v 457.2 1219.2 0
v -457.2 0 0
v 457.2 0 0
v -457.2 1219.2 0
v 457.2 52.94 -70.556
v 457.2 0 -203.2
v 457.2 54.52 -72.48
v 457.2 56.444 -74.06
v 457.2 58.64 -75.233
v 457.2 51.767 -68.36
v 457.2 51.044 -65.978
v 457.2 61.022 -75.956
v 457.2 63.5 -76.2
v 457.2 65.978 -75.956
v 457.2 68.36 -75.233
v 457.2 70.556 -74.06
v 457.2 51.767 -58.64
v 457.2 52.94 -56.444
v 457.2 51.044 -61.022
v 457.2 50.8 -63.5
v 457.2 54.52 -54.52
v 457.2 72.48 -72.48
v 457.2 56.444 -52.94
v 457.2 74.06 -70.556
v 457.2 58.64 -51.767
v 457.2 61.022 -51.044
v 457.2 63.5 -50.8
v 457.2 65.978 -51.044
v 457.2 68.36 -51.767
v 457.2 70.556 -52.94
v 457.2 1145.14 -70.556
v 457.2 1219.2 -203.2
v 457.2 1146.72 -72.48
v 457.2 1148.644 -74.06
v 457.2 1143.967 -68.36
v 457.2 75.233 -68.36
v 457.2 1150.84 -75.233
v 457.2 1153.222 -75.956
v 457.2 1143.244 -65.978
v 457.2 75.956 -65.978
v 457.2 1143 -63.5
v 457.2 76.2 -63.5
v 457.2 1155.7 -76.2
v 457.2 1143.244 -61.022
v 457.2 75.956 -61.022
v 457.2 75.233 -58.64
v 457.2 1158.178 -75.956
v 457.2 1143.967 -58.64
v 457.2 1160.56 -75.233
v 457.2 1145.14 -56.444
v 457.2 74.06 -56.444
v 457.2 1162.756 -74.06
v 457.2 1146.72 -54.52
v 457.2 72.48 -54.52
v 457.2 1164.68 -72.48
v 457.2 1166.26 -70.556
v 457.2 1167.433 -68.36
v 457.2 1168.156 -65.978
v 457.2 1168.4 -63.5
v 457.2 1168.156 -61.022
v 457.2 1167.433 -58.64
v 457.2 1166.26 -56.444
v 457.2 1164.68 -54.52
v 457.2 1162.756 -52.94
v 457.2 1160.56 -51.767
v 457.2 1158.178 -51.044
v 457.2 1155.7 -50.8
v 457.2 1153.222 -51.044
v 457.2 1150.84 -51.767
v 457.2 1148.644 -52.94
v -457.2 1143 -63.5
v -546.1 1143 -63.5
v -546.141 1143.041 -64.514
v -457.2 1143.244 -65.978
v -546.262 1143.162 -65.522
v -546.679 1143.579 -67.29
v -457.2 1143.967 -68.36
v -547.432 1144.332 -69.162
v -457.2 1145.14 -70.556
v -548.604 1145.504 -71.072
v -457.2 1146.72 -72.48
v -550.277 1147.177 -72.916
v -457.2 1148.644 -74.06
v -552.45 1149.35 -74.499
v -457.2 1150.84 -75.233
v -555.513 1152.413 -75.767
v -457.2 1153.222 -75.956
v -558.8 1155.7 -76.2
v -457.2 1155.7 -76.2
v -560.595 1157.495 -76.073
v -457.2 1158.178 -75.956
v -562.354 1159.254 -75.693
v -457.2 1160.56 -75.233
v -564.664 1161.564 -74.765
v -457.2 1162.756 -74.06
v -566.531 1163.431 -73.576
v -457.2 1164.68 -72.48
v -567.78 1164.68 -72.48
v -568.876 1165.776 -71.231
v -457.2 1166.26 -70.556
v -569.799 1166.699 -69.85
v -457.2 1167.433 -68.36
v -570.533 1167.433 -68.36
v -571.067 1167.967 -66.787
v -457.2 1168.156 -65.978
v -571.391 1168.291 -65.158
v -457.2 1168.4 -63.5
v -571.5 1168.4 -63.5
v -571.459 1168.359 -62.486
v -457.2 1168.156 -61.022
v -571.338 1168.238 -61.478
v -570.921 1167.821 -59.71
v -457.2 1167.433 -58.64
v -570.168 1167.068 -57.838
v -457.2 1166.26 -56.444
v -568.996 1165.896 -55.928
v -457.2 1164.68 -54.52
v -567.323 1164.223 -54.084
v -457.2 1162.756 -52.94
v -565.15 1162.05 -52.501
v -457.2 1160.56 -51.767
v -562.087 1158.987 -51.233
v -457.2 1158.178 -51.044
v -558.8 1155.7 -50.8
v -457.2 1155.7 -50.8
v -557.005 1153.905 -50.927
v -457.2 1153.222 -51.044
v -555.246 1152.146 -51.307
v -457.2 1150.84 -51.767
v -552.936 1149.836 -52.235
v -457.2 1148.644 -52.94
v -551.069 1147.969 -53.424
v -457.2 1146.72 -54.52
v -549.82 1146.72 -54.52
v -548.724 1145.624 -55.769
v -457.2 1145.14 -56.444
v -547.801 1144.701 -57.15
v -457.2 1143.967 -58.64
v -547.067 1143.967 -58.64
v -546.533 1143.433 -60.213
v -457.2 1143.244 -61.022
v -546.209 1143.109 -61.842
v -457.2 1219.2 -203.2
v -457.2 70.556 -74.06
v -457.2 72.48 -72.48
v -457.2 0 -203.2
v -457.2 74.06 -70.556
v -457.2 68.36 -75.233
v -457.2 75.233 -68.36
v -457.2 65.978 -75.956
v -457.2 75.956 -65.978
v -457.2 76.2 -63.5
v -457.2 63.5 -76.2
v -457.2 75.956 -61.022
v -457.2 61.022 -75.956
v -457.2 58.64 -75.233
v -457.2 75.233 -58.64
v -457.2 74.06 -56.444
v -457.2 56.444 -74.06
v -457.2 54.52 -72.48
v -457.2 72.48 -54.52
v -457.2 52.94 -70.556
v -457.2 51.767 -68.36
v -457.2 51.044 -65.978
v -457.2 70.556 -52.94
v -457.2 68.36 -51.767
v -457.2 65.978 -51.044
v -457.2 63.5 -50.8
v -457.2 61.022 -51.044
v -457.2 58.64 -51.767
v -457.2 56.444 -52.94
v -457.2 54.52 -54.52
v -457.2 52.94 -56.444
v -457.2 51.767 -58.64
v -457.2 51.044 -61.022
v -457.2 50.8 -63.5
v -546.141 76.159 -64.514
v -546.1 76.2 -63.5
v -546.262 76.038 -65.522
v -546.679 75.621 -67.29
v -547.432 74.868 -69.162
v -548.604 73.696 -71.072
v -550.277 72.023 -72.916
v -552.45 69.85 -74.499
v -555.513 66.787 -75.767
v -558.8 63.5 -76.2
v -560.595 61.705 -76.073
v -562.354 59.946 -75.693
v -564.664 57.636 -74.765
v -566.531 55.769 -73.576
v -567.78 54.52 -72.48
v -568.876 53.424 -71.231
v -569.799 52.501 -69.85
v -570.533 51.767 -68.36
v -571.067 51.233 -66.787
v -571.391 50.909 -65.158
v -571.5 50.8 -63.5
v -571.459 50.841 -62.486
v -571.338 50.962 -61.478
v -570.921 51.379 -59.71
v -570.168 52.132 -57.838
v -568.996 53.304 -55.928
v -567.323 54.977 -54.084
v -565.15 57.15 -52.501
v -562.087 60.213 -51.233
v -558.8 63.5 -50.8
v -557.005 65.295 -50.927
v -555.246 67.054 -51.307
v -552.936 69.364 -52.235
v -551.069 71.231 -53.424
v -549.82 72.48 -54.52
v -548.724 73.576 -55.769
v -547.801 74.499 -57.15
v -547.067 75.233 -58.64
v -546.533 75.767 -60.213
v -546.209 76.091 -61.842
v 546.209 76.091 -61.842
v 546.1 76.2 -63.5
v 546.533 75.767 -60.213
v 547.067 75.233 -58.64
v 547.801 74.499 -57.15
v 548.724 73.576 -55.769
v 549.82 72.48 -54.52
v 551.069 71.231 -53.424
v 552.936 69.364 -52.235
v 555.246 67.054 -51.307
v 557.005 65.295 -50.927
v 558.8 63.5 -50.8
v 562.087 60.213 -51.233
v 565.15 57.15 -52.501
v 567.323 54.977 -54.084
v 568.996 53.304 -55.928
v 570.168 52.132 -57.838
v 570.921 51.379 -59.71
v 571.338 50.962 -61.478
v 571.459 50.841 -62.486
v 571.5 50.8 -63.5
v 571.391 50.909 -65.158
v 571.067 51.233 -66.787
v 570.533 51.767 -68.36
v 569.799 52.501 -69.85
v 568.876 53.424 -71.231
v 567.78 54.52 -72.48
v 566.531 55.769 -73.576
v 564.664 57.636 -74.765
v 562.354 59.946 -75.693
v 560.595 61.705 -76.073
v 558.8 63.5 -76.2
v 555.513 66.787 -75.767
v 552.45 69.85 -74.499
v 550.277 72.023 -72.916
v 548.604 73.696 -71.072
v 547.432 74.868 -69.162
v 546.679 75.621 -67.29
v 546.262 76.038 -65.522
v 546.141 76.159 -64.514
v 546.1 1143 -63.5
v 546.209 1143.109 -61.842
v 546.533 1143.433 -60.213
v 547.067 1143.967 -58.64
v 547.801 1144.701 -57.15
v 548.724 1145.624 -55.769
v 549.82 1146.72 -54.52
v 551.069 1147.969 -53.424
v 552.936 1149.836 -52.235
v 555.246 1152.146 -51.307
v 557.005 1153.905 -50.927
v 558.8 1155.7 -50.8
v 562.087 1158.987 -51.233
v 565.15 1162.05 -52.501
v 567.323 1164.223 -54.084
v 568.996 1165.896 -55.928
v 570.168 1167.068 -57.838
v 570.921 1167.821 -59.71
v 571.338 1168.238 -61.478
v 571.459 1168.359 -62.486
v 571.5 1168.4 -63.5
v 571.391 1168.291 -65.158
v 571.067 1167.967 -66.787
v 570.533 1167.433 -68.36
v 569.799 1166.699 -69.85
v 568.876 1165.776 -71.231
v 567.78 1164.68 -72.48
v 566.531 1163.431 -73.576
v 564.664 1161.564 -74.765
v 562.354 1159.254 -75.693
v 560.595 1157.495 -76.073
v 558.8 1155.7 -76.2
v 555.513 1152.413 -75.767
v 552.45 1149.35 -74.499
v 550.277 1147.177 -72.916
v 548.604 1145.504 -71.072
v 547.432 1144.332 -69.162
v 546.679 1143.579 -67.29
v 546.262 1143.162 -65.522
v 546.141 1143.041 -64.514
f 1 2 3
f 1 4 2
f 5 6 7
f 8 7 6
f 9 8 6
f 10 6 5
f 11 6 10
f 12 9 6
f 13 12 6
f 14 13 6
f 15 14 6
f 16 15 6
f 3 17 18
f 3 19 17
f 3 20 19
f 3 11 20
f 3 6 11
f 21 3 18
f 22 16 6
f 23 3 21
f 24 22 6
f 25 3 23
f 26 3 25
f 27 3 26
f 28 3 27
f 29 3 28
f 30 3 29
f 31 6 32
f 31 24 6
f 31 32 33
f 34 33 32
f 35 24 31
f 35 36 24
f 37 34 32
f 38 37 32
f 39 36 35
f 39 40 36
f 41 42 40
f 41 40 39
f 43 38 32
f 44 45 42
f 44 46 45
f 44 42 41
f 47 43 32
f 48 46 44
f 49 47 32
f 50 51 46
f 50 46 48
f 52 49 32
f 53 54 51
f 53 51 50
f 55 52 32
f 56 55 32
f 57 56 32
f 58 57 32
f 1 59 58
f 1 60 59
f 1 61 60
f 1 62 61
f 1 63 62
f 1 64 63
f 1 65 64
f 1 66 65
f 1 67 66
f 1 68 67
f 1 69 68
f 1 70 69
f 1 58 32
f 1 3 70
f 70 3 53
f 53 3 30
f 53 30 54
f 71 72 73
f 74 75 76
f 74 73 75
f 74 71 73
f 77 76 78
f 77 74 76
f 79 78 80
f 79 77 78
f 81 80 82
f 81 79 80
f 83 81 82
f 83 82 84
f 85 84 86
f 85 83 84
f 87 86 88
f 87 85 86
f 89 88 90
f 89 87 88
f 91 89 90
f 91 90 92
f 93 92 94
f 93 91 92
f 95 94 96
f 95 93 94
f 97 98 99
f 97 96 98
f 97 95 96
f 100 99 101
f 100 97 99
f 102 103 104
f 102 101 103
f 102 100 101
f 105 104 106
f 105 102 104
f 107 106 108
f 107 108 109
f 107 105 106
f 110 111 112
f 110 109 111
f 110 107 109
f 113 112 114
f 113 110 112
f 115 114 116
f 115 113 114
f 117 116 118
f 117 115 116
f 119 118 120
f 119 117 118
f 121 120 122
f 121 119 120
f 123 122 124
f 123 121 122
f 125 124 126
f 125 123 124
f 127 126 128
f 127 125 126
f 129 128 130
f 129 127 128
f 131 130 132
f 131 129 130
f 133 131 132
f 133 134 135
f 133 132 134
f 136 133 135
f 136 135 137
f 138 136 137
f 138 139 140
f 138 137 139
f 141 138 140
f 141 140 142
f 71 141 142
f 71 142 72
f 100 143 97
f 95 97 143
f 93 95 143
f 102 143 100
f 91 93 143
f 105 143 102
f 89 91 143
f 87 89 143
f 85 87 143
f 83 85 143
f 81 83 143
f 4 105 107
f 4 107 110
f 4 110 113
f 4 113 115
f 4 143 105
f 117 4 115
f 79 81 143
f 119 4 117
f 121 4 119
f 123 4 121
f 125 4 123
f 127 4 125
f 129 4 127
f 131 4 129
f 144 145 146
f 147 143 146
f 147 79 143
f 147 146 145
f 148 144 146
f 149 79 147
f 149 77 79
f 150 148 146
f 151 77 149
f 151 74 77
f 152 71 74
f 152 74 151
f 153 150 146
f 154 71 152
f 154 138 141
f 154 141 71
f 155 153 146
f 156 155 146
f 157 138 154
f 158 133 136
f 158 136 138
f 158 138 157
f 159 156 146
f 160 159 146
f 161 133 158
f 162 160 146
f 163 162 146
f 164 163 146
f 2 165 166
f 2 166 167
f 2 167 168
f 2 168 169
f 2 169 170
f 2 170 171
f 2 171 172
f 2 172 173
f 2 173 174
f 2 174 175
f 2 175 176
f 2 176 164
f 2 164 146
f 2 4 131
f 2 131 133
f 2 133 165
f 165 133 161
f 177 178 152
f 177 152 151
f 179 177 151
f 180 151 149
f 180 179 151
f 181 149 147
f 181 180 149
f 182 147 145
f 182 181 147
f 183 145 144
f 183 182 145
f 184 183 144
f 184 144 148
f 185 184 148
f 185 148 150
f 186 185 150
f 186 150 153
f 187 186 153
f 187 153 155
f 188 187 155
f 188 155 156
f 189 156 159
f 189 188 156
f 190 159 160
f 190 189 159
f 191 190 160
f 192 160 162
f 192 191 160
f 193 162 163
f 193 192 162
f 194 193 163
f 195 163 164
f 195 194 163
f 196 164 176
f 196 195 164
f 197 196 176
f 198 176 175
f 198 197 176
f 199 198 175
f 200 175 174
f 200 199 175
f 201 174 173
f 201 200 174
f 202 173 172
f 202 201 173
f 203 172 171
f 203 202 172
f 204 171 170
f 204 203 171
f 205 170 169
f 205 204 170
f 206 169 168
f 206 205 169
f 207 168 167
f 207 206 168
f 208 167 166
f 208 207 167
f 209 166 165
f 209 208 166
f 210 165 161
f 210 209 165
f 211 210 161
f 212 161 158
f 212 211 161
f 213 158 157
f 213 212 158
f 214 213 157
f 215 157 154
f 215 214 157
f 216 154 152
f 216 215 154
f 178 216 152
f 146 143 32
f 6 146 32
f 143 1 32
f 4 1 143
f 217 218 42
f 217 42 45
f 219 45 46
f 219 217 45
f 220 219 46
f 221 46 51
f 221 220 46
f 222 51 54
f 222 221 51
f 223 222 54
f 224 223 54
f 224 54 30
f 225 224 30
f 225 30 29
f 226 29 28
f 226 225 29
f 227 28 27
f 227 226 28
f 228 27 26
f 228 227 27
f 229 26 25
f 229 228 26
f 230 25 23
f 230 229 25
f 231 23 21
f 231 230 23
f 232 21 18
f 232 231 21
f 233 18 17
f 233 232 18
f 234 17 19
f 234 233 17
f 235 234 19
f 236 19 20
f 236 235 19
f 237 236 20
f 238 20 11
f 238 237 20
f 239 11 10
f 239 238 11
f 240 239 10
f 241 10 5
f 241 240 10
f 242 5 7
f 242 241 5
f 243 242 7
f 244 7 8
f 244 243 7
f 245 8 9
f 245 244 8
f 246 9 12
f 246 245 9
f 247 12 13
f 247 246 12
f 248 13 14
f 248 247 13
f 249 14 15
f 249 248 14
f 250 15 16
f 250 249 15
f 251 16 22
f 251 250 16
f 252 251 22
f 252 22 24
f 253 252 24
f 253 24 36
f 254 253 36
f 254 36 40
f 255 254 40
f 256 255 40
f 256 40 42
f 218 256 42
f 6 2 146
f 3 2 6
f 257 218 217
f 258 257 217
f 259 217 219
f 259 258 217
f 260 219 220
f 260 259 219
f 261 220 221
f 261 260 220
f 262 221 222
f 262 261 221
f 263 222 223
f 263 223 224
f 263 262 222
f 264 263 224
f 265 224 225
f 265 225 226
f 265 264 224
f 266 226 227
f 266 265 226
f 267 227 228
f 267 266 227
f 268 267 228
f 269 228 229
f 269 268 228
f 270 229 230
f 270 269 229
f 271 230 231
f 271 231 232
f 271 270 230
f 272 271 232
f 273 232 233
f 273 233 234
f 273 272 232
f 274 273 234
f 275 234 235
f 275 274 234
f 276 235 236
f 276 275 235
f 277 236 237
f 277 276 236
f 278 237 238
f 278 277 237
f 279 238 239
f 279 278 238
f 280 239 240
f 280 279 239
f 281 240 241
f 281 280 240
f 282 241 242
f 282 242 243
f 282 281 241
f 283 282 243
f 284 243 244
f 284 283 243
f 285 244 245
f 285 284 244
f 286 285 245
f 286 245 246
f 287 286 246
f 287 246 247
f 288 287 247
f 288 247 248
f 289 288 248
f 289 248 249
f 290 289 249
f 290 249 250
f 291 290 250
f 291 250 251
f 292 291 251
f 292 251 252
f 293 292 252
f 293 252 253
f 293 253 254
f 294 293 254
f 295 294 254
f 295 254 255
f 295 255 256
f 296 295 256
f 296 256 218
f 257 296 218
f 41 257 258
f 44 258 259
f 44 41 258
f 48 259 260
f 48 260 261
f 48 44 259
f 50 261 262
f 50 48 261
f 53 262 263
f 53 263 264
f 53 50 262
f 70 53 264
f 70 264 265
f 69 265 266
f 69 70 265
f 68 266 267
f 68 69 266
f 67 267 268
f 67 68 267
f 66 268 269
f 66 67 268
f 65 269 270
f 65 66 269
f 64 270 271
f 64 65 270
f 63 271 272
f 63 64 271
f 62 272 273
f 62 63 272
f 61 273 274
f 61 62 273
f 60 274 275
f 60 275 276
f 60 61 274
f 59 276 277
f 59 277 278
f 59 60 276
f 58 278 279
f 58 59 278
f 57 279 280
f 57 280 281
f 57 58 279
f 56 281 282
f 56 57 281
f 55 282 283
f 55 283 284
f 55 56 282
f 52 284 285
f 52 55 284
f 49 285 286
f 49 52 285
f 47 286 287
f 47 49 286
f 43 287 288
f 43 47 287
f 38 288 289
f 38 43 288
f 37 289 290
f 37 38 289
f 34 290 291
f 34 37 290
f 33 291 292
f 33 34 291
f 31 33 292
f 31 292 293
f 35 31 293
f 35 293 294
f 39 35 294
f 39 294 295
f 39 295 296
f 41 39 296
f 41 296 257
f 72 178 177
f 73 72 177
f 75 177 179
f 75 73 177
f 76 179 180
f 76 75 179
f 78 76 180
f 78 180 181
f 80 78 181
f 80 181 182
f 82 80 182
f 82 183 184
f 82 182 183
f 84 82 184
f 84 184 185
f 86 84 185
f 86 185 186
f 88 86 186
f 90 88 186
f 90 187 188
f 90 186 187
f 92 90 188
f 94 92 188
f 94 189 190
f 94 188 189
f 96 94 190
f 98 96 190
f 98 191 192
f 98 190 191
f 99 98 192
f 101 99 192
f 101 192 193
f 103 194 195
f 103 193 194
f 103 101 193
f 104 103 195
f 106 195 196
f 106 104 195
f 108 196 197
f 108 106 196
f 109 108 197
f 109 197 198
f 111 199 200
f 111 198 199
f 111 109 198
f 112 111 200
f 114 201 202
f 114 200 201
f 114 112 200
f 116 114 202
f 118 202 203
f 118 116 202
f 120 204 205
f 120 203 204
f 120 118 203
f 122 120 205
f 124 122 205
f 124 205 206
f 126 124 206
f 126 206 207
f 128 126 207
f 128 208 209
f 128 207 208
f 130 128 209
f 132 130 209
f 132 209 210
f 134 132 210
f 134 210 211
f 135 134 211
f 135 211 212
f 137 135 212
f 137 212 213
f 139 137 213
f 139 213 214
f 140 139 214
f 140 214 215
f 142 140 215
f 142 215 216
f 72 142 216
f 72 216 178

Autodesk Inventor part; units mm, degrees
ref_plane "PLANE IN" through (0, 0, 0) normal (0, 1, 0) x (-1, 0, 0)
ref_plane "PLANE OUT" through (0, 1219.2, 0) normal (0, 1, 0) x (-1, 0, 0)
ref_plane "PLANE CTR" through (0, 0, 0) normal (1, 0, 0) x (0, 1, 0)
ref_plane "PLANE RH" through (457.2, 0, 0) normal (1, 0, 0) x (0, 1, 0)
ref_plane "PLANE LH" through (-457.2, 0, 0) normal (1, 0, 0) x (0, 1, 0)
ref_plane "PLANE TOP" through (0, 0, 0) normal (0, 0, 1) x (1, 0, 0)
ref_plane "PLANE BOT" through (0, 0, -203.2) normal (0, 0, 1) x (1, 0, 0)
ref_plane "PLANE HANDLE RH" through (558.8, 0, 0) normal (1, 0, 0) x (0, 1, 0)
ref_plane "PLANE HANDLE LH" through (-558.8, 0, 0) normal (1, 0, 0) x (0, 1, 0)
ref_plane "PLANE HANDLE IN" through (0, 63.5, 0) normal (0, 1, 0) x (-1, 0, 0)
ref_plane "PLANE HANDLE OUT" through (0, 1155.7, 0) normal (0, 1, 0) x (-1, 0, 0)
ref_plane "PLANE HANDLE TOP" through (0, 0, -63.5) normal (0, 0, 1) x (1, 0, 0)
sketch "SKETCH BODY" plane through (0, 0, 0) normal (0, 0, 1) x (1, 0, 0)
  line L0 (-457.2, 0) -> (457.2, 0)
  line L1 (457.2, 0) -> (457.2, 1219.2)
  line L2 (457.2, 1219.2) -> (-457.2, 1219.2)
  line L3 (-457.2, 1219.2) -> (-457.2, 0)
  line L4 (-640.08, 0) -> (640.08, 0) projected
  line L5 (-640.08, 1219.2) -> (640.08, 1219.2) projected
  line L6 (457.2, 3657.6) -> (457.2, -609.6) projected
  line L7 (-457.2, 3657.6) -> (-457.2, -609.6) projected
extrude "EXT BODY" add sketch "SKETCH BODY" against normal blind 203.2
sketch "SKETCH HANDLE DIA" plane through (457.2, 0, 0) normal (1, 0, 0) x (0, 1, 0)
  line L0 (45.72, -63.5) -> (81.28, -63.5) projected
  line L1 (63.5, -45.72) -> (63.5, -81.28) projected
  circle A0 centre (63.5, -63.5) radius 12.7
  dimension "d79" = 25.4
sketch "SKETCH HANDLE PATH" plane through (0, 0, -63.5) normal (0, 0, 1) x (1, 0, 0)
  line L0 (558.8, 3568.7) -> (558.8, -520.7) projected
  line L1 (457.2, 3568.7) -> (457.2, -520.7) projected
  line L2 (436.88, 63.5) -> (579.12, 63.5) projected
  line L3 (436.88, 1155.7) -> (579.12, 1155.7) projected
  line L4 (457.2, 63.5) -> (558.8, 63.5)
  line L5 (558.8, 63.5) -> (558.8, 1155.7)
  line L6 (558.8, 1155.7) -> (457.2, 1155.7)
  line L7 (457.2, 1155.7) -> (457.2, 63.5) construction
sweep "SWP HANDLE" add profiles "SKETCH HANDLE DIA" path "SKETCH HANDLE PATH" path curves L4 L5 L6
mirror "MIR HANDLE" about plane through (0, 0, 0) normal (1, 0, 0)
equation "\"d76\" = HEIGHT"
equation "\"PLANE_OUT\" = LENGTH"
equation "\"PLANE_RH\" = 0.5 * WIDTH"
equation "\"PLANE_LH\" = -0.5 * WIDTH"
equation "\"PLANE_BOT\" = -HEIGHT"
equation "\"PLANE_HANDLE_RH\" = HANDLE_OFFSET_CTR"
equation "\"PLANE_HANDLE_LH\" = -HANDLE_OFFSET_CTR"
equation "\"PLANE_HANDLE_IN\" = HANDLE_OFFSET_END"
equation "\"PLANE_HANDLE_OUT\" = LENGTH - HANDLE_OFFSET_END"
equation "\"PLANE_HANDLE_TOP\" = -HANDLE_OFFSET_TOP"
equation "\"LENGTH\" = 1219.2"
equation "\"WIDTH\" = 914.4"
equation "\"HEIGHT\" = 203.2"
equation "\"HANDLE_GAP\" = 101.6"
equation "\"HANDLE_OFFSET_CTR\" = 0.5 * WIDTH + HANDLE_GAP"
equation "\"HANDLE_OFFSET_END\" = 63.5"
equation "\"HANDLE_OFFSET_TOP\" = 63.5"
properties part number "Blog Part"
